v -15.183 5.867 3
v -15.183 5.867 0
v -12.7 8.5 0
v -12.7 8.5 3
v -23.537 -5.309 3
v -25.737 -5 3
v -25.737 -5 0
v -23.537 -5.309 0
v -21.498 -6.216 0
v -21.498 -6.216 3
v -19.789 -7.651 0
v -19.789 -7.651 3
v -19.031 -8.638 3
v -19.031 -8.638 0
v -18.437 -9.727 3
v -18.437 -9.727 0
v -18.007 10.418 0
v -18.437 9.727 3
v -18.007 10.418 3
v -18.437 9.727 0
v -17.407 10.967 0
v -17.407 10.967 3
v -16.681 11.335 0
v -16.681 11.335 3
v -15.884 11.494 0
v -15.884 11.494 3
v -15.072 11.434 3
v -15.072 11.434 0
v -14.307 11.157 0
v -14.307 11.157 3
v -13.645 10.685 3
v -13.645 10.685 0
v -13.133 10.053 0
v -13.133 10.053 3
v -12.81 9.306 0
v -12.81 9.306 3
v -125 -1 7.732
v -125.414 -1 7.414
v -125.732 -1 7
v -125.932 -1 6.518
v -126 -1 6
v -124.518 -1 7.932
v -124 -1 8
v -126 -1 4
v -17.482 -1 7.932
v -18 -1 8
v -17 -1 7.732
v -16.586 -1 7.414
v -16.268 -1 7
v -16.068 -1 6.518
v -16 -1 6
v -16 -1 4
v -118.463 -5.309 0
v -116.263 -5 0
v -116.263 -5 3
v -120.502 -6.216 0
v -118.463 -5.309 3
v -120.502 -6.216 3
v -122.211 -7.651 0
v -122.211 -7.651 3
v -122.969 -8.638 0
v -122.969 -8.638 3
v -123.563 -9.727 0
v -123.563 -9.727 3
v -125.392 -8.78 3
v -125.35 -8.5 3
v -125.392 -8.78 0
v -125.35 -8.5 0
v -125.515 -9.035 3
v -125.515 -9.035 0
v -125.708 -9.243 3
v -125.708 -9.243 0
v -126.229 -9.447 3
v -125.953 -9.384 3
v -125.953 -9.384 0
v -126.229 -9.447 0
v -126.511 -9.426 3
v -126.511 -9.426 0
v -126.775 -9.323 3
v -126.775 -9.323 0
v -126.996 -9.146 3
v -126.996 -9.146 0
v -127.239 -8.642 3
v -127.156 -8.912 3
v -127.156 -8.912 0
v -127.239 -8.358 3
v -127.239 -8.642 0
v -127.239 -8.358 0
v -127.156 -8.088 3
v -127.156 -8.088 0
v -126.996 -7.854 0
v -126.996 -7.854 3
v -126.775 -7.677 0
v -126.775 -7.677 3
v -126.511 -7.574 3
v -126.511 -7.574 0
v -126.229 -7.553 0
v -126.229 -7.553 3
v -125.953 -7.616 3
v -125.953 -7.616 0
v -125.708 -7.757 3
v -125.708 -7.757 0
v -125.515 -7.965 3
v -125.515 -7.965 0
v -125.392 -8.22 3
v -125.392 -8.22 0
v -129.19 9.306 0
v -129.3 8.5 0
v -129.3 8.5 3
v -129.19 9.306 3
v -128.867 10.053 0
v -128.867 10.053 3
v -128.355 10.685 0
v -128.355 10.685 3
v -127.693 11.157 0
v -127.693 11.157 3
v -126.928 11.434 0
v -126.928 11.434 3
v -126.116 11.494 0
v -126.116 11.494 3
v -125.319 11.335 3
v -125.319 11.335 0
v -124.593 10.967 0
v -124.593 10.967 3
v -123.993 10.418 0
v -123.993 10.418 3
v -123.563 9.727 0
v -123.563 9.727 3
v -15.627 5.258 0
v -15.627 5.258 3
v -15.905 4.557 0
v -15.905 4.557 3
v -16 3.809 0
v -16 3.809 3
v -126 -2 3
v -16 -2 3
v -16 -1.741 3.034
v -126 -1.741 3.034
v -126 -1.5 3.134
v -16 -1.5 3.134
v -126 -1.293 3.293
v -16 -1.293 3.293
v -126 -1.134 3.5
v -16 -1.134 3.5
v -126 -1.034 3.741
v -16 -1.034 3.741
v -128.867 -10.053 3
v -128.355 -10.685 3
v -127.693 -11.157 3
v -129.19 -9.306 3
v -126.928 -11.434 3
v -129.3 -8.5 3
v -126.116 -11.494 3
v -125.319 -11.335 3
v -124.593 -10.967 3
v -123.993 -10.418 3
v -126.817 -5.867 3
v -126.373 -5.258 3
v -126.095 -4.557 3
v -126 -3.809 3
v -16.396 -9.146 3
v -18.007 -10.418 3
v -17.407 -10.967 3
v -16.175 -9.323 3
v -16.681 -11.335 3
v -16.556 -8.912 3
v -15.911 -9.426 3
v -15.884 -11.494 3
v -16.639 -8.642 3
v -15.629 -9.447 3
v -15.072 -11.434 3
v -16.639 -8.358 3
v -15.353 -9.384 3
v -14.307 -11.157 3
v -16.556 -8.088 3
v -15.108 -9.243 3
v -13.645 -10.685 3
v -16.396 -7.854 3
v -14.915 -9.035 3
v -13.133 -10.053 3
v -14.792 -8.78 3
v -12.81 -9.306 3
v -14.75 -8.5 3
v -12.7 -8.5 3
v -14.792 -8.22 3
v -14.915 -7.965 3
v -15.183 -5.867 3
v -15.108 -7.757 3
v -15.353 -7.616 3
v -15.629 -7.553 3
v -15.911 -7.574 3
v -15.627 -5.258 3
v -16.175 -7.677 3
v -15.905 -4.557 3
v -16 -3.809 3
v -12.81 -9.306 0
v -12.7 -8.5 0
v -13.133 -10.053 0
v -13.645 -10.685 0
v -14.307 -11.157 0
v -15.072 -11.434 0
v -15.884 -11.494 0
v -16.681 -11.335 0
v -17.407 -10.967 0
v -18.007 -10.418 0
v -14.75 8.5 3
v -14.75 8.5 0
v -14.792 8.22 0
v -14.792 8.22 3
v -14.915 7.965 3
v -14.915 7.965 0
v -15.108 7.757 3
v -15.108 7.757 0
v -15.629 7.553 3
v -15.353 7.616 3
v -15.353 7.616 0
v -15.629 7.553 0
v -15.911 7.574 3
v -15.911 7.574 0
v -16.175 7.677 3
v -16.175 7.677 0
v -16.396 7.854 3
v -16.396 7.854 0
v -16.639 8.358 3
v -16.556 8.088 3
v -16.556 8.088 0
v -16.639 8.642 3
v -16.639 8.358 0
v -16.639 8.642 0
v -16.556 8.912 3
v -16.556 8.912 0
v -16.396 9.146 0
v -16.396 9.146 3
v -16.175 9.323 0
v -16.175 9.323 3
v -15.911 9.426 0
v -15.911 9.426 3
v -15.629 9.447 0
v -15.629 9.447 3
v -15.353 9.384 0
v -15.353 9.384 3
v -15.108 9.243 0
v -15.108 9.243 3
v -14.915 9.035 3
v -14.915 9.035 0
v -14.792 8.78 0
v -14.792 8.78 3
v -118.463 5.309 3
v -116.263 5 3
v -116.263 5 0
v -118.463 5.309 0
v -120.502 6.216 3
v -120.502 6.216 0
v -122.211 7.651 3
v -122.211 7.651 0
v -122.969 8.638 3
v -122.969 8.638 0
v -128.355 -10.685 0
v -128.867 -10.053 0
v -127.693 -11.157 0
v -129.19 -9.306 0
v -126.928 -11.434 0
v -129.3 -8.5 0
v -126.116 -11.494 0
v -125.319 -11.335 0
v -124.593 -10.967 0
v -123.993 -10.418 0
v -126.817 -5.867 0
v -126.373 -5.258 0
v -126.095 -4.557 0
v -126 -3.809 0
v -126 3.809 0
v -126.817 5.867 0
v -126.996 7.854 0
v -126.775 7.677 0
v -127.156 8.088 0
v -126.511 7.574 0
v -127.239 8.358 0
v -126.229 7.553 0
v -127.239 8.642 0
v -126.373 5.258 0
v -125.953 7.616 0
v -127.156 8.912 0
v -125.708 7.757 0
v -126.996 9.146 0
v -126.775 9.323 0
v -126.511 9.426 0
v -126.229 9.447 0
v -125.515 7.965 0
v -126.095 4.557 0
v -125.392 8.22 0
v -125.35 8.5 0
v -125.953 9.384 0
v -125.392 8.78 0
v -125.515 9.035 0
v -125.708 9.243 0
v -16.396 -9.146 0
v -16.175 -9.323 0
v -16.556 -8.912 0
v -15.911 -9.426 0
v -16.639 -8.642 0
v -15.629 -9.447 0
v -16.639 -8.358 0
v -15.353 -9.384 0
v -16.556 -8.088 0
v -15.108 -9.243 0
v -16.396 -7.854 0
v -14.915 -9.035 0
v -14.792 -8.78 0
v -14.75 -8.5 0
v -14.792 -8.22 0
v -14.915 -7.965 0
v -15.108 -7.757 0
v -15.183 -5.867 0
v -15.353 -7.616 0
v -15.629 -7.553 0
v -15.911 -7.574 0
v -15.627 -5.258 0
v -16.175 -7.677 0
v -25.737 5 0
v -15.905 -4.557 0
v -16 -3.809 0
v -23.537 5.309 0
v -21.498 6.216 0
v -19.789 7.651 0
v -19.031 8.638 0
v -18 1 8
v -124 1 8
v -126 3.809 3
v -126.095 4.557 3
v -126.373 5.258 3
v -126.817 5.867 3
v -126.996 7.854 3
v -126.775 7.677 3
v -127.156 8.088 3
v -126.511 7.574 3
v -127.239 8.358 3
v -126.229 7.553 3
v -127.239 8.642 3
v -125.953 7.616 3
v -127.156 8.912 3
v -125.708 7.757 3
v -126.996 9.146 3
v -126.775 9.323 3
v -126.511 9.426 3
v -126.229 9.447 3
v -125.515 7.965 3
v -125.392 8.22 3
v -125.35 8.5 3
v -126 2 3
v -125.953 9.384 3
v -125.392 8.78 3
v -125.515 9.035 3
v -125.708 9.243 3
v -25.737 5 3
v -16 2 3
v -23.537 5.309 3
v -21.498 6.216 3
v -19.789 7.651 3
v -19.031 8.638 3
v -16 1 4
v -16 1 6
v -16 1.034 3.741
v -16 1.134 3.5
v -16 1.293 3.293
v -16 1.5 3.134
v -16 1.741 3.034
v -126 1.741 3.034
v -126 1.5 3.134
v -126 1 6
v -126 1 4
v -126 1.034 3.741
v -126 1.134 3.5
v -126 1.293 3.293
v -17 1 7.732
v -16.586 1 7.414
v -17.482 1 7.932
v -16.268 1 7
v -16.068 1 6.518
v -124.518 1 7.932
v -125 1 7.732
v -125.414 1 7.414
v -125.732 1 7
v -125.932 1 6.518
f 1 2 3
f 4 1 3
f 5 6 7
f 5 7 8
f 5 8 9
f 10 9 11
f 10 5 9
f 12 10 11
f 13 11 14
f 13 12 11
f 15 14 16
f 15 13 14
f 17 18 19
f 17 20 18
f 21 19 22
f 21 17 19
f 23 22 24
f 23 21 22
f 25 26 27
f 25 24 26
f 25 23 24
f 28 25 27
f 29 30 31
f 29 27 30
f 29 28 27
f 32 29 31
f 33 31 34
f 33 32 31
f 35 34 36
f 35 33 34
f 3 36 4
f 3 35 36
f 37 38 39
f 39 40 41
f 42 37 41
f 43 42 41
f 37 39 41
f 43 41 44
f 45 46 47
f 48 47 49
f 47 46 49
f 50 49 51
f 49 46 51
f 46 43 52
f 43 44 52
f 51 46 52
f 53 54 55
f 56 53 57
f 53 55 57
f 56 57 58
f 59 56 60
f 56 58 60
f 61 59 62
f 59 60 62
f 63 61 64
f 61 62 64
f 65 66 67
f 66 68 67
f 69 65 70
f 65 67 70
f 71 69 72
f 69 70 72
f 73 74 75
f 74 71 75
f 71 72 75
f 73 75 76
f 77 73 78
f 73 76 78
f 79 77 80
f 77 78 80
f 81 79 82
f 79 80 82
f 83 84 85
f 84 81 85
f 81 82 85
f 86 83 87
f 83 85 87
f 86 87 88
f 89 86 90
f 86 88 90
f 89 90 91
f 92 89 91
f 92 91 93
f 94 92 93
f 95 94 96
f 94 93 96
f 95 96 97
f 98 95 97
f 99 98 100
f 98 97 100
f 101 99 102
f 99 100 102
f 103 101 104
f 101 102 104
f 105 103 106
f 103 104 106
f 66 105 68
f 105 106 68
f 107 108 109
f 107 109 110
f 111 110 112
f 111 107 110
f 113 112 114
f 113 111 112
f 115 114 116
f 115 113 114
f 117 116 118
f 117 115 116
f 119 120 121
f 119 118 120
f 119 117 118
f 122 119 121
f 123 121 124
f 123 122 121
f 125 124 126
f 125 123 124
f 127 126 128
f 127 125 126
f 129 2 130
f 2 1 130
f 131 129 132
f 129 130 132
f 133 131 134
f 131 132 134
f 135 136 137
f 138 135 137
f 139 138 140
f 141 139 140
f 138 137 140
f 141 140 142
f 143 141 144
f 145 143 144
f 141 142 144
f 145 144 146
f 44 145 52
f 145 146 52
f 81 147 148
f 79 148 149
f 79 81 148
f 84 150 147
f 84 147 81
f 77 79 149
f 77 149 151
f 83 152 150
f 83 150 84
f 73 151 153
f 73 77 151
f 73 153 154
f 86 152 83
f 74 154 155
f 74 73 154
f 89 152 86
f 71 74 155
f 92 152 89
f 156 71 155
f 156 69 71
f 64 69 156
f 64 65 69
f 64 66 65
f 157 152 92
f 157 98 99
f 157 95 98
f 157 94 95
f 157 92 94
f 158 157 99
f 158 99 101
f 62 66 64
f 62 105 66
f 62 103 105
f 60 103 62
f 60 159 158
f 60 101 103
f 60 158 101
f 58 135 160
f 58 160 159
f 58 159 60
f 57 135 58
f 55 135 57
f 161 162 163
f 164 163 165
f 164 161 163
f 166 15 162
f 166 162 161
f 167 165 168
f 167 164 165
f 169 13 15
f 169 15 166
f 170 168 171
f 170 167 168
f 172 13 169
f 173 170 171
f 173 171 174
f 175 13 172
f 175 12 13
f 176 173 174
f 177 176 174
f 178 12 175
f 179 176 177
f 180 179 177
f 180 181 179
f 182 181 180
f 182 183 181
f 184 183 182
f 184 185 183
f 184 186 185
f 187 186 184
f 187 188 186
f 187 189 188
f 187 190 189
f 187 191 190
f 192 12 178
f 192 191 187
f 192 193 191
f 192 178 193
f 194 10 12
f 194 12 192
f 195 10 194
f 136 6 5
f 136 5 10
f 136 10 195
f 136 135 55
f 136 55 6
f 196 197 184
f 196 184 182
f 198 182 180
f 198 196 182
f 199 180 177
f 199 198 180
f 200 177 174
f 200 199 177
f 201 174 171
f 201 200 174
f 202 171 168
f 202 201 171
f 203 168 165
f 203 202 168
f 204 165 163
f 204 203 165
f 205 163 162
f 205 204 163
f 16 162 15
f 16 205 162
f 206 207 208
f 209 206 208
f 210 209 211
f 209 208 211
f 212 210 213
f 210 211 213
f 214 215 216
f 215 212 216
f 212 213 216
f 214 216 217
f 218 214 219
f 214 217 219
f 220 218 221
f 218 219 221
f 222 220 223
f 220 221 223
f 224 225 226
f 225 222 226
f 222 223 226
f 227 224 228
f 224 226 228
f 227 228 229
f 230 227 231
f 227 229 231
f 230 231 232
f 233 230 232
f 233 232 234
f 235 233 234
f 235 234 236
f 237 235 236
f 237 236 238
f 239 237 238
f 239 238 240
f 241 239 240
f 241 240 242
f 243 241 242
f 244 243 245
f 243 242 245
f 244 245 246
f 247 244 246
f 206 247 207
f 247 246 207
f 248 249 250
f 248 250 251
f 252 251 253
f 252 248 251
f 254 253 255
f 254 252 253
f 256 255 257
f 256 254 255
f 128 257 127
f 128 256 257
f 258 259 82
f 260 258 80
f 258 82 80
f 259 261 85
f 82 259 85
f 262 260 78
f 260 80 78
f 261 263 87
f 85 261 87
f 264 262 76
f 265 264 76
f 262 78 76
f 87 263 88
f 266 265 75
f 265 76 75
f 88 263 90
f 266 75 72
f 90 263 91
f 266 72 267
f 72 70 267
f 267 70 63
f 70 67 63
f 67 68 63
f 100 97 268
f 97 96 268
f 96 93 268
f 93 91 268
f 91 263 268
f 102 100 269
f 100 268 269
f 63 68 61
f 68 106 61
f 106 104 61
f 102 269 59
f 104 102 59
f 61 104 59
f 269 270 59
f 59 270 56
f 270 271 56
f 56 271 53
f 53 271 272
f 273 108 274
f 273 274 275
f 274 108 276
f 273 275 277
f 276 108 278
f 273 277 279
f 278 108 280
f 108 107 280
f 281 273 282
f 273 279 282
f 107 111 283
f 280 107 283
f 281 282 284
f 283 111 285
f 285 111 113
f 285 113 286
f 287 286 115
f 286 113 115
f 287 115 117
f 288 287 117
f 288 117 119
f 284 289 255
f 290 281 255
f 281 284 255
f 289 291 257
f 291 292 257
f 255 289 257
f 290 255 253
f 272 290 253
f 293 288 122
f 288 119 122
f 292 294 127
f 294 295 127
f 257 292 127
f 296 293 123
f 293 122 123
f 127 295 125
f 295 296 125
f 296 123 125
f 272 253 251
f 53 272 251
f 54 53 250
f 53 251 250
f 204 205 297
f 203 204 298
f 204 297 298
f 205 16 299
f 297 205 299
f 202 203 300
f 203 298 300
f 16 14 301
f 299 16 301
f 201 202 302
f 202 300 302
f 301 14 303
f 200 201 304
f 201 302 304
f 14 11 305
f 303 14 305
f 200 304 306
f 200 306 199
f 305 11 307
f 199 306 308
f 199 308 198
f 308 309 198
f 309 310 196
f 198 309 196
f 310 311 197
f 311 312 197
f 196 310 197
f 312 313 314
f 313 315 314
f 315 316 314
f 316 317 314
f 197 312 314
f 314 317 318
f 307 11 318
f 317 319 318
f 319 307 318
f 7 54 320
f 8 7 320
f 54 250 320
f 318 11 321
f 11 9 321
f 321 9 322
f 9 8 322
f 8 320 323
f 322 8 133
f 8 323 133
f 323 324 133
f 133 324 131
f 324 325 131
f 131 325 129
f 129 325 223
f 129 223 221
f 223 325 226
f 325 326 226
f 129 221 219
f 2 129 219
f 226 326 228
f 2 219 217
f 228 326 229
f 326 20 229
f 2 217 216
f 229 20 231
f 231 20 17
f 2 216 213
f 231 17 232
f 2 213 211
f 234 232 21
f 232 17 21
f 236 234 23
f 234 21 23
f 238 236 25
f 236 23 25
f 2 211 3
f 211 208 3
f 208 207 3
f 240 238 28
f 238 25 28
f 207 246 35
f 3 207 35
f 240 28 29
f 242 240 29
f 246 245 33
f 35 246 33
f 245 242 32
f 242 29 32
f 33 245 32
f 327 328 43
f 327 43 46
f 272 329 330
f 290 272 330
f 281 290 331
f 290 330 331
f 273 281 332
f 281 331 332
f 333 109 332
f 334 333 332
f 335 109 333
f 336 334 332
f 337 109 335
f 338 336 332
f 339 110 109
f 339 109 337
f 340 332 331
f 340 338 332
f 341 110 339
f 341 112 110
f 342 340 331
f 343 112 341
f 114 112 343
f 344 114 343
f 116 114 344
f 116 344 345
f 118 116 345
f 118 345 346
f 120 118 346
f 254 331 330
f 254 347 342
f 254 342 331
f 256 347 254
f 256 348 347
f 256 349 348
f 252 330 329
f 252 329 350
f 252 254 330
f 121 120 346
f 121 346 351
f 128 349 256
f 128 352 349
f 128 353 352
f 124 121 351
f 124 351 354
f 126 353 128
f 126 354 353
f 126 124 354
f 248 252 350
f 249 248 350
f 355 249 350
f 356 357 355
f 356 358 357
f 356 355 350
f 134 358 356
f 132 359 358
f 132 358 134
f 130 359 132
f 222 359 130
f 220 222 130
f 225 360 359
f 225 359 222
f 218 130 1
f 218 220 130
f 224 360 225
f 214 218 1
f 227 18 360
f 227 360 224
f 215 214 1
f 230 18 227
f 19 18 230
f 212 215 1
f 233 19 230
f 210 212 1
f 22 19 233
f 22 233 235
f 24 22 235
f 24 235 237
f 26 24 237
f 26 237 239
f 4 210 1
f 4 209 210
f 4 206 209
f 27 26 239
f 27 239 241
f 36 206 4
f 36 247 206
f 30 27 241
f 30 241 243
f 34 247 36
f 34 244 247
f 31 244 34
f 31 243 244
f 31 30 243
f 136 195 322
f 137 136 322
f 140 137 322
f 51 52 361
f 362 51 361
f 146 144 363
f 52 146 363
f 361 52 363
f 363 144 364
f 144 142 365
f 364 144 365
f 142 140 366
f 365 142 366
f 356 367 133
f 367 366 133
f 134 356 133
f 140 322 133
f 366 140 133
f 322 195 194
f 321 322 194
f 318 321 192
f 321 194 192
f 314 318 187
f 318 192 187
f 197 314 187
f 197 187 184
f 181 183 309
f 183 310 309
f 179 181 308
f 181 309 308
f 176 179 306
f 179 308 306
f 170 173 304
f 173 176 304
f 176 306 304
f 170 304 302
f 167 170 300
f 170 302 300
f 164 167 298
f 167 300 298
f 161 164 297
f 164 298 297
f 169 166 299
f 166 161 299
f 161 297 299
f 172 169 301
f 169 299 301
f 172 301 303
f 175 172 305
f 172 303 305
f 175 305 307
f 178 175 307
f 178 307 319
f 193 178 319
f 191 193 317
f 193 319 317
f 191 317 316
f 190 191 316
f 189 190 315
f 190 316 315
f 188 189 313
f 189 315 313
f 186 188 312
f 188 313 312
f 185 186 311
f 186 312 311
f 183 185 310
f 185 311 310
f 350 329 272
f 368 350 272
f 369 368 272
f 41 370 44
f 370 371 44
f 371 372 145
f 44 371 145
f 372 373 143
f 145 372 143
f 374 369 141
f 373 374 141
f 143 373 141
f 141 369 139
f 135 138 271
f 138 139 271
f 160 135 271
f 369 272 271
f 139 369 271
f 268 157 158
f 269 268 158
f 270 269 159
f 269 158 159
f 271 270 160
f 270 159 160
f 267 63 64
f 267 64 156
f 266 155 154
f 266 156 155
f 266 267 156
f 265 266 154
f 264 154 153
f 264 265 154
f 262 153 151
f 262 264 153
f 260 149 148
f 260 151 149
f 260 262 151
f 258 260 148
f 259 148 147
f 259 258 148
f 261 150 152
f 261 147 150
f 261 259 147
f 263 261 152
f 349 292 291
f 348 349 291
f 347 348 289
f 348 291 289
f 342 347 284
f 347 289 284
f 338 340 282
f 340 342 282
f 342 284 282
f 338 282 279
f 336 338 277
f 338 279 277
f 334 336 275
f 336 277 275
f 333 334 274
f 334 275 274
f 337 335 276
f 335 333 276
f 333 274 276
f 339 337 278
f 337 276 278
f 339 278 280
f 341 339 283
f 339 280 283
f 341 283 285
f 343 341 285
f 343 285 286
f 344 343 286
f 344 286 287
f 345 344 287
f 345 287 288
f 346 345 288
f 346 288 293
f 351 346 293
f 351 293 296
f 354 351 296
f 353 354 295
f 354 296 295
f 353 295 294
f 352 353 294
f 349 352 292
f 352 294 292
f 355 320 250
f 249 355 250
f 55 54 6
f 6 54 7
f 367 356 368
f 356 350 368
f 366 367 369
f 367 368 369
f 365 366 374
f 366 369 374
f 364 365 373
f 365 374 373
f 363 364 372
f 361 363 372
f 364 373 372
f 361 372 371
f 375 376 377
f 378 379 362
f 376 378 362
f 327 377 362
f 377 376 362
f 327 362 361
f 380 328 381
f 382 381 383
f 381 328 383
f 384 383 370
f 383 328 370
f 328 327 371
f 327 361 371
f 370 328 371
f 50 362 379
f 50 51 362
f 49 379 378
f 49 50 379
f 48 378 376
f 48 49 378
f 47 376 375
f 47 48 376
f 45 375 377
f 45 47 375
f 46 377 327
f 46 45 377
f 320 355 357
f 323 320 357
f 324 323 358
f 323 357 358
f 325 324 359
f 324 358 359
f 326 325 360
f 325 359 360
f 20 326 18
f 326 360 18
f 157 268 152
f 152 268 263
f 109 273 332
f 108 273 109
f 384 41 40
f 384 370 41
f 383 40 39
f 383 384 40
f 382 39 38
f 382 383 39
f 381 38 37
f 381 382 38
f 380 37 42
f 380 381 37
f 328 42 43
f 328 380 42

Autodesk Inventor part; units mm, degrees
ref_plane "YZ Plane" through (0, 0, 0) normal (1, 0, 0) x (0, 1, 0)
ref_plane "XZ Plane" through (0, 0, 0) normal (0, 1, 0) x (-1, 0, 0)
ref_plane "XY Plane" through (0, 0, 0) normal (0, 0, 1) x (1, 0, 0)
sketch "Sketch1" plane through (0, 0, 0) normal (0, 0, 1) x (1, 0, 0)
  circle A0 centre (-126.3, 8.5) radius 0.95 projected
  circle A1 centre (-126.3, -8.5) radius 0.95 projected
  circle A2 centre (-15.7, -8.5) radius 0.95 projected
  circle A3 centre (-15.7, 8.5) radius 0.95 projected
  line L0 (-21, 18) -> (-21, -18) projected
  line L1 (-121, -18) -> (-121, 18) projected
  line L2 (-121, 0) -> (-21, 0)
  line L3 (-126, 5) -> (-126, -5)
  line L4 (-126, -5) -> (-16, -5)
  line L5 (-16, -5) -> (-16, 5)
  line L6 (-16, 5) -> (-126, 5)
  line L7 (-126, 5) -> (-16, -5) construction
  line L8 (-126, -5) -> (-16, 5) construction
  line L9 (-126.3, 8.5) -> (-126.3, -8.5) construction
  line L10 (-129.3, 8.5) -> (-129.3, -8.5)
  line L11 (-123.3, -8.5) -> (-123.3, 8.5)
  arc A4 (-123.3, 8.5) -> (-129.3, 8.5) centre (-126.3, 8.5) ccw
  arc A5 (-129.3, -8.5) -> (-123.3, -8.5) centre (-126.3, -8.5) ccw
  line L12 (-15.7, 8.5) -> (-15.7, -8.5) construction
  line L13 (-18.7, 8.5) -> (-18.7, -8.5)
  line L14 (-12.7, -8.5) -> (-12.7, 8.5)
  arc A6 (-12.7, 8.5) -> (-18.7, 8.5) centre (-15.7, 8.5) ccw
  arc A7 (-18.7, -8.5) -> (-12.7, -8.5) centre (-15.7, -8.5) ccw
  line L15 (-16, 5) -> (-12.7, 8.5)
  line L16 (-16, -5) -> (-12.7, -8.5)
  line L17 (-126, 5) -> (-129.3, 8.5)
  line L18 (-126, -5) -> (-129.3, -8.5)
  point P0 (0, 0)
  point P1 (-71, 0)
  point P2 (-126.3, 0)
  point P3 (-15.7, 0)
  point P4 (-123.3, 5)
  point P5 (-123.3, -5)
  point P6 (-18.7, -5)
  point P7 (-18.7, 5)
  dimension "d0" = 10
  dimension "d1" = 110
  dimension "d2" = 6
  dimension "d3" = 6
extrude "Extrusion1" add sketch "Sketch1" along normal blind 3 contours L6 L13 L4 L0 | L0 L2 L1 L6 | L0 L4 L1 L2 | L13 A6 L15 L6 | L6 L5 L4 L13 | L1 L4 L11 L6 | L4 L16 A7 L13 | L11 L4 L3 L6 | L6 L17 A4 L11 | L11 A5 L18 L4
fillet "Fillet1" radius 8 4 edges at (-123.3, 5, 1.5) (-123.3, -5, 1.5) (-18.7, -5, 1.5) (-18.7, 5, 1.5)
fillet "Fillet2" radius 3 4 edges at (-126, 5, 1.5) (-126, -5, 1.5) (-16, 5, 1.5) (-16, -5, 1.5)
sketch "Sketch2" plane through (0, 0, 3) normal (0, 0, 1) x (1, 0, 0)
  arc A0 (-18.4375, -9.7273) -> (-12.7, -8.5) centre (-15.7, -8.5) ccw projected
  line L0 (-12.7, -8.5) -> (-15.1828, -5.8668) projected
  arc A1 (-16, -3.8087) -> (-15.1828, -5.8668) centre (-13, -3.8087) ccw projected
  line L1 (-16, -3.8087) -> (-16, 3.8087) projected
  arc A2 (-15.1828, 5.8668) -> (-16, 3.8087) centre (-13, 3.8087) ccw projected
  line L2 (-15.1828, 5.8668) -> (-12.7, 8.5) projected
  arc A3 (-12.7, 8.5) -> (-18.4375, 9.7273) centre (-15.7, 8.5) ccw projected
  arc A4 (-25.7374, 5) -> (-18.4375, 9.7273) centre (-25.7374, 13) ccw projected
  line L3 (-25.7374, 5) -> (-116.2626, 5) projected
  arc A5 (-123.5625, 9.7273) -> (-116.2626, 5) centre (-116.2626, 13) ccw projected
  arc A6 (-123.5625, 9.7273) -> (-129.3, 8.5) centre (-126.3, 8.5) ccw projected
  line L4 (-129.3, 8.5) -> (-126.8172, 5.8668) projected
  arc A7 (-126, 3.8087) -> (-126.8172, 5.8668) centre (-129, 3.8087) ccw projected
  line L5 (-126, 3.8087) -> (-126, -3.8087) projected
  arc A8 (-126.8172, -5.8668) -> (-126, -3.8087) centre (-129, -3.8087) ccw projected
  line L6 (-126.8172, -5.8668) -> (-129.3, -8.5) projected
  arc A9 (-129.3, -8.5) -> (-123.5625, -9.7273) centre (-126.3, -8.5) ccw projected
  arc A10 (-116.2626, -5) -> (-123.5625, -9.7273) centre (-116.2626, -13) ccw projected
  line L7 (-116.2626, -5) -> (-25.7374, -5) projected
  arc A11 (-18.4375, -9.7273) -> (-25.7374, -5) centre (-25.7374, -13) ccw projected
  circle A12 centre (-15.7, 8.5) radius 0.95 projected
  circle A13 centre (-15.7, -8.5) radius 0.95 projected
  circle A14 centre (-126.3, -8.5) radius 0.95 projected
  circle A15 centre (-126.3, 8.5) radius 0.95 projected
  line L8 (-126, 3.8087) -> (-126, -3.8087) projected
  line L9 (-126, 0) -> (-16, 0)
  line L10 (-126, 1) -> (-126, -1)
  line L11 (-126, -1) -> (-16, -1)
  line L12 (-16, -1) -> (-16, 1)
  line L13 (-16, 1) -> (-126, 1)
  line L14 (-126, 1) -> (-16, -1) construction
  line L15 (-126, -1) -> (-16, 1) construction
  line L16 (-16, -3.8087) -> (-16, 3.8087) projected
  point P0 (0, 0)
  point P1 (-71, 0)
  dimension "d8" = 2
extrude "Extrusion2" add sketch "Sketch2" along normal blind 5 contours L11 L5 L9 L1 | L9 L5 L13 L1
fillet "Fillet3" radius 1 2 edges at (-71, -1, 3) (-71, 1, 3)
fillet "Fillet4" radius 2 2 edges at (-126, 0, 8) (-16, 0, 8)
properties part number "test_bridge_1"
